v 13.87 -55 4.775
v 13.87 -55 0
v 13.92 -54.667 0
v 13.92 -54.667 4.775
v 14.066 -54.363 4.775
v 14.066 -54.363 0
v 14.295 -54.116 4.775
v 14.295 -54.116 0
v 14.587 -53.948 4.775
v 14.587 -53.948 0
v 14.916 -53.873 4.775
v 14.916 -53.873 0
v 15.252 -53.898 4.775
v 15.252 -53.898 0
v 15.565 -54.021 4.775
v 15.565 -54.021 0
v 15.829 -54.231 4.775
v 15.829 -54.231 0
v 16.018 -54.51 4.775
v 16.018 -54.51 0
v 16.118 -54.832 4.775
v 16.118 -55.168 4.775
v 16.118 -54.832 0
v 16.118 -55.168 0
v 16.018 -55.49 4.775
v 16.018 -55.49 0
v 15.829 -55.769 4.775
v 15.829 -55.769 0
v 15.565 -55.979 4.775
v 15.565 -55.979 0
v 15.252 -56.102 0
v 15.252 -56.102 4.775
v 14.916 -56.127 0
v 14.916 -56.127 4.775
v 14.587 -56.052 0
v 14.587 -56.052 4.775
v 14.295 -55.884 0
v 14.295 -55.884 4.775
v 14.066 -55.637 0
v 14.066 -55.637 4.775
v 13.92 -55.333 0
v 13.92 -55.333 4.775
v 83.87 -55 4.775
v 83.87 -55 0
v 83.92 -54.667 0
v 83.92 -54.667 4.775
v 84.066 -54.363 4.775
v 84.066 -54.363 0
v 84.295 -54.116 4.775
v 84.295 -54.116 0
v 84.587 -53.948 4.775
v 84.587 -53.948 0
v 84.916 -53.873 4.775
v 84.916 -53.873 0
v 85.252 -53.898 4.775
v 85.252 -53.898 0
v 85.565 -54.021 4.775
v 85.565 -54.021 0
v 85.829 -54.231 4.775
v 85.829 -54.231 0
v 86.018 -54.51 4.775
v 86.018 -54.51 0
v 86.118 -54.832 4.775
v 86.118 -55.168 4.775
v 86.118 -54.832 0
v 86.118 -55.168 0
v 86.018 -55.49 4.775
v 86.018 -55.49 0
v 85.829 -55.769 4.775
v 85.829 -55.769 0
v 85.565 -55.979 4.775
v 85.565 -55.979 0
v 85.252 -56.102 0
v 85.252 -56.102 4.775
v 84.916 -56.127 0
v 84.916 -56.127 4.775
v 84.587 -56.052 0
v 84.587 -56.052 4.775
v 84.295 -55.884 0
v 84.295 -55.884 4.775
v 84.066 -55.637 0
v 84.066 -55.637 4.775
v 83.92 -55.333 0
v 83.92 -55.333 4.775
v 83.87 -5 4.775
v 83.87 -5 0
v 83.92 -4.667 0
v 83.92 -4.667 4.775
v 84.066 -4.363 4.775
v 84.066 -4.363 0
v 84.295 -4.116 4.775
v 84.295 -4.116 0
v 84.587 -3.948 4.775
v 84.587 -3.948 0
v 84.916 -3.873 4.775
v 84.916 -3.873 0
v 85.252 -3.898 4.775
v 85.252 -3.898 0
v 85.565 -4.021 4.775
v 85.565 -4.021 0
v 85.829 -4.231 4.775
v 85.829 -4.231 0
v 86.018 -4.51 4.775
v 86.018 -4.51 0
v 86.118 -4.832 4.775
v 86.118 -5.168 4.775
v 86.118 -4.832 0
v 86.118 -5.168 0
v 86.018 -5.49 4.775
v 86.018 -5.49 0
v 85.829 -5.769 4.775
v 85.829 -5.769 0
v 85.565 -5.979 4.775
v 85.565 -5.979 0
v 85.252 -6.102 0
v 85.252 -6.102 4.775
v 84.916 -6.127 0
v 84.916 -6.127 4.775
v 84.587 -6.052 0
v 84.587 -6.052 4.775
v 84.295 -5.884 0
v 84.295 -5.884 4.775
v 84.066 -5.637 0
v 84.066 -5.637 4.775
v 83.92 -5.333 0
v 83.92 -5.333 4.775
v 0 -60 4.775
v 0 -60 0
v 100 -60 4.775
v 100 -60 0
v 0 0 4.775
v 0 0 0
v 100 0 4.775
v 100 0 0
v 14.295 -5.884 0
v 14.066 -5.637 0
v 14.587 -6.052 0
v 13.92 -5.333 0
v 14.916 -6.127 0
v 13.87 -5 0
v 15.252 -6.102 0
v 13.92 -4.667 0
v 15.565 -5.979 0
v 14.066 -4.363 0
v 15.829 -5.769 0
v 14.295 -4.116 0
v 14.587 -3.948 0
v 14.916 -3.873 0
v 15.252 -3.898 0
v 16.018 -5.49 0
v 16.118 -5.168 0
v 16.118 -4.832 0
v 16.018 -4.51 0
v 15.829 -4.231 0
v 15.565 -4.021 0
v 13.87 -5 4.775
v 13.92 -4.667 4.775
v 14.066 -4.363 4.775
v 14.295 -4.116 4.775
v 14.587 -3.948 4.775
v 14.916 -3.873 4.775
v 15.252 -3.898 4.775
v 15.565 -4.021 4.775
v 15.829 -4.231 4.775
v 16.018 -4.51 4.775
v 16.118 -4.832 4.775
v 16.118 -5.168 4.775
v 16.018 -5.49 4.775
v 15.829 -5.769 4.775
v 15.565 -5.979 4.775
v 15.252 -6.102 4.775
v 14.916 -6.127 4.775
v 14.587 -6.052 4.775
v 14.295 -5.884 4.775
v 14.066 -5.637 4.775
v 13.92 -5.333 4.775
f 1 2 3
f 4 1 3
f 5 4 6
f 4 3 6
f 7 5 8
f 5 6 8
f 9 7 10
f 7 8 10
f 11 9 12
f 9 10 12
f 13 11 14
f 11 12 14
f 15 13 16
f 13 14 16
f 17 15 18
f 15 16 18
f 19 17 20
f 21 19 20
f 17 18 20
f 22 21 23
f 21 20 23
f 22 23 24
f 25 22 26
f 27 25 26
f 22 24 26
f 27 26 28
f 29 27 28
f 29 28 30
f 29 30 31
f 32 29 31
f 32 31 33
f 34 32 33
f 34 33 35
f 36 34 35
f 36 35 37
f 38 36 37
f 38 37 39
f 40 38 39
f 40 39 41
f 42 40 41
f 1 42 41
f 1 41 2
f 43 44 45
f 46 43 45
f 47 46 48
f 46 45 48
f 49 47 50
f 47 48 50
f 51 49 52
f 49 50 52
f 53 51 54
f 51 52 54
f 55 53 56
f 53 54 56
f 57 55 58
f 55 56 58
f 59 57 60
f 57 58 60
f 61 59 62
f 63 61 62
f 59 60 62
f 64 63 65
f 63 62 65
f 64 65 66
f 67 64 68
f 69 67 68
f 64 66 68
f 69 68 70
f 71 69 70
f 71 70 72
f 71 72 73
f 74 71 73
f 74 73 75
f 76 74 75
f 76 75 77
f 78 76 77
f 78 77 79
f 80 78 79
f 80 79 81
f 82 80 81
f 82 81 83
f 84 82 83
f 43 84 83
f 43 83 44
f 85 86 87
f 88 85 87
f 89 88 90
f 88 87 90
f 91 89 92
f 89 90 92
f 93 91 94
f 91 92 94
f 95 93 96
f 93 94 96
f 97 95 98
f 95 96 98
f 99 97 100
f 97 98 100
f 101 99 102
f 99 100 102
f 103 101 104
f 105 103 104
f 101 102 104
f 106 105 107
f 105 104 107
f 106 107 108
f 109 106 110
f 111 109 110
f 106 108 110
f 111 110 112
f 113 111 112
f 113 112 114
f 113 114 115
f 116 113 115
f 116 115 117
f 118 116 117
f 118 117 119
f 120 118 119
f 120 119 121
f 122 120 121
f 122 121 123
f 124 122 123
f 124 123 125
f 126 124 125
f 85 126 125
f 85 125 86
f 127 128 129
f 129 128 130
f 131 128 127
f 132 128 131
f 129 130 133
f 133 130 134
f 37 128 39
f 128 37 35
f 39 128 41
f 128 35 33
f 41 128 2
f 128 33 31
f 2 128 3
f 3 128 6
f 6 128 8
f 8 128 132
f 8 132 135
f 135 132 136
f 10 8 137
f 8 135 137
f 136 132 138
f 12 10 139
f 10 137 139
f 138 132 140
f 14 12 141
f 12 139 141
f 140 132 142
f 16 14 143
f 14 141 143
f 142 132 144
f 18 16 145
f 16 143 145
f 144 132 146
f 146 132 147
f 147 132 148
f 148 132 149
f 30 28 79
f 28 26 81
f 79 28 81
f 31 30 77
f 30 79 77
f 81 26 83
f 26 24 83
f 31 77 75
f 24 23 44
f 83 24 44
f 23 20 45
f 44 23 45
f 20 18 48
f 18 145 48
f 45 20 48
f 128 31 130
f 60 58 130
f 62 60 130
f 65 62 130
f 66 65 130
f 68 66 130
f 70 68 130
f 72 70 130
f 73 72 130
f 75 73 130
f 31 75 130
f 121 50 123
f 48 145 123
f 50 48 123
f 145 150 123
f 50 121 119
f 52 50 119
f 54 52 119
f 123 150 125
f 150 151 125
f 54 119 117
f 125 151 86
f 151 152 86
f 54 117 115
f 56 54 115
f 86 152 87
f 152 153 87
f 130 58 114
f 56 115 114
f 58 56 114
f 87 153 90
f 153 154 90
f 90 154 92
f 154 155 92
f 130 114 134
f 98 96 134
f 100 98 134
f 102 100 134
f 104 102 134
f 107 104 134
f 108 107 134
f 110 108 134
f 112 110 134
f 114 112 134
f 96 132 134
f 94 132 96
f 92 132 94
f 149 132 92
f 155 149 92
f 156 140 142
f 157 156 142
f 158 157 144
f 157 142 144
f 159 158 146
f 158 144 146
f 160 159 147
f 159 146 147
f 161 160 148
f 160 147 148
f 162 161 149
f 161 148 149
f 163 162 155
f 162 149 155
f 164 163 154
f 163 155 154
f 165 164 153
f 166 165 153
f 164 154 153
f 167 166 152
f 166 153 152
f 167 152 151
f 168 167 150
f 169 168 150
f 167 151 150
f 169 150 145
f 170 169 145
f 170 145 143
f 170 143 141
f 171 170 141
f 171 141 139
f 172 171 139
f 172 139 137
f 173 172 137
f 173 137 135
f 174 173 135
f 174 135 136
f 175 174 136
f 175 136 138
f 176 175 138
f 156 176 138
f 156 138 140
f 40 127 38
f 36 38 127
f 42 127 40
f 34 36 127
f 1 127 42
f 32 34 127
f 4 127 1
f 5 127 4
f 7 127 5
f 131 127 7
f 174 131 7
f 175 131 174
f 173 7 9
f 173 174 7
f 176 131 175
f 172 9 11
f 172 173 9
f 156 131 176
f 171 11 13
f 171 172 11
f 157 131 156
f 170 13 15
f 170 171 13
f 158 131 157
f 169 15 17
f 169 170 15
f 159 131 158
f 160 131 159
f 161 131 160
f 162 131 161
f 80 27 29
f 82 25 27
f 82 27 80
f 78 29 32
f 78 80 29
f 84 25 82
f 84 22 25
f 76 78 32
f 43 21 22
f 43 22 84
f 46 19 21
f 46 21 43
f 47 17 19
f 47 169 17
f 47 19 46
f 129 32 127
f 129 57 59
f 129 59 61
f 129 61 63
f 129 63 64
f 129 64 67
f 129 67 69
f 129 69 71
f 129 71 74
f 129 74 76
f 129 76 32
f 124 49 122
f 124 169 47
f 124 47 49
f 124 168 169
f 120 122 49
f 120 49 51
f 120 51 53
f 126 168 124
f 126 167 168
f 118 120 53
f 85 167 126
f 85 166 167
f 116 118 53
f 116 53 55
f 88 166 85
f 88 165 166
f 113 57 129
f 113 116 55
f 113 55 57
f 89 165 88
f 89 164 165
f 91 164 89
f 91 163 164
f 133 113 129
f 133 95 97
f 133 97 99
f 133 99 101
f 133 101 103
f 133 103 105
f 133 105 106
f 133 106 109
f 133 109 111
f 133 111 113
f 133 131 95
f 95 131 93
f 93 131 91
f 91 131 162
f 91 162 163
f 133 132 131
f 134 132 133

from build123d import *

# Parameters (mm, degrees)
SKETCH1_W             = 100
SKETCH1_H             = 60
SKETCH1_R             = 1.13
BOSS_EXTRUDE1_DEPTH   = 4.7752
F_4_40_TAPPED_HOLE1_D = 2.2606


with BuildPart() as part:
    # Sketch1 → Boss-Extrude1 (new body)
    with BuildSketch(Plane.XY):
        with Locations((50, -30)):
            Rectangle(SKETCH1_W, SKETCH1_H)
        with Locations((15, -5)):
            Circle(SKETCH1_R, mode=Mode.SUBTRACT)
        with Locations((15, -55)):
            Circle(SKETCH1_R, mode=Mode.SUBTRACT)
        with Locations((85, -5)):
            Circle(SKETCH1_R, mode=Mode.SUBTRACT)
        with Locations((85, -55)):
            Circle(SKETCH1_R, mode=Mode.SUBTRACT)
    extrude(amount=BOSS_EXTRUDE1_DEPTH)

    # #4-40 Tapped Hole1 (through all)
    with Locations(Plane(origin=(15, -5, 4.7752), x_dir=(1, 0, 0), z_dir=(0, 0, 1))):
        with Locations((0, 0), (0, -50), (70, -50), (70, 0)):
            Hole(F_4_40_TAPPED_HOLE1_D / 2)


solid = part.part
